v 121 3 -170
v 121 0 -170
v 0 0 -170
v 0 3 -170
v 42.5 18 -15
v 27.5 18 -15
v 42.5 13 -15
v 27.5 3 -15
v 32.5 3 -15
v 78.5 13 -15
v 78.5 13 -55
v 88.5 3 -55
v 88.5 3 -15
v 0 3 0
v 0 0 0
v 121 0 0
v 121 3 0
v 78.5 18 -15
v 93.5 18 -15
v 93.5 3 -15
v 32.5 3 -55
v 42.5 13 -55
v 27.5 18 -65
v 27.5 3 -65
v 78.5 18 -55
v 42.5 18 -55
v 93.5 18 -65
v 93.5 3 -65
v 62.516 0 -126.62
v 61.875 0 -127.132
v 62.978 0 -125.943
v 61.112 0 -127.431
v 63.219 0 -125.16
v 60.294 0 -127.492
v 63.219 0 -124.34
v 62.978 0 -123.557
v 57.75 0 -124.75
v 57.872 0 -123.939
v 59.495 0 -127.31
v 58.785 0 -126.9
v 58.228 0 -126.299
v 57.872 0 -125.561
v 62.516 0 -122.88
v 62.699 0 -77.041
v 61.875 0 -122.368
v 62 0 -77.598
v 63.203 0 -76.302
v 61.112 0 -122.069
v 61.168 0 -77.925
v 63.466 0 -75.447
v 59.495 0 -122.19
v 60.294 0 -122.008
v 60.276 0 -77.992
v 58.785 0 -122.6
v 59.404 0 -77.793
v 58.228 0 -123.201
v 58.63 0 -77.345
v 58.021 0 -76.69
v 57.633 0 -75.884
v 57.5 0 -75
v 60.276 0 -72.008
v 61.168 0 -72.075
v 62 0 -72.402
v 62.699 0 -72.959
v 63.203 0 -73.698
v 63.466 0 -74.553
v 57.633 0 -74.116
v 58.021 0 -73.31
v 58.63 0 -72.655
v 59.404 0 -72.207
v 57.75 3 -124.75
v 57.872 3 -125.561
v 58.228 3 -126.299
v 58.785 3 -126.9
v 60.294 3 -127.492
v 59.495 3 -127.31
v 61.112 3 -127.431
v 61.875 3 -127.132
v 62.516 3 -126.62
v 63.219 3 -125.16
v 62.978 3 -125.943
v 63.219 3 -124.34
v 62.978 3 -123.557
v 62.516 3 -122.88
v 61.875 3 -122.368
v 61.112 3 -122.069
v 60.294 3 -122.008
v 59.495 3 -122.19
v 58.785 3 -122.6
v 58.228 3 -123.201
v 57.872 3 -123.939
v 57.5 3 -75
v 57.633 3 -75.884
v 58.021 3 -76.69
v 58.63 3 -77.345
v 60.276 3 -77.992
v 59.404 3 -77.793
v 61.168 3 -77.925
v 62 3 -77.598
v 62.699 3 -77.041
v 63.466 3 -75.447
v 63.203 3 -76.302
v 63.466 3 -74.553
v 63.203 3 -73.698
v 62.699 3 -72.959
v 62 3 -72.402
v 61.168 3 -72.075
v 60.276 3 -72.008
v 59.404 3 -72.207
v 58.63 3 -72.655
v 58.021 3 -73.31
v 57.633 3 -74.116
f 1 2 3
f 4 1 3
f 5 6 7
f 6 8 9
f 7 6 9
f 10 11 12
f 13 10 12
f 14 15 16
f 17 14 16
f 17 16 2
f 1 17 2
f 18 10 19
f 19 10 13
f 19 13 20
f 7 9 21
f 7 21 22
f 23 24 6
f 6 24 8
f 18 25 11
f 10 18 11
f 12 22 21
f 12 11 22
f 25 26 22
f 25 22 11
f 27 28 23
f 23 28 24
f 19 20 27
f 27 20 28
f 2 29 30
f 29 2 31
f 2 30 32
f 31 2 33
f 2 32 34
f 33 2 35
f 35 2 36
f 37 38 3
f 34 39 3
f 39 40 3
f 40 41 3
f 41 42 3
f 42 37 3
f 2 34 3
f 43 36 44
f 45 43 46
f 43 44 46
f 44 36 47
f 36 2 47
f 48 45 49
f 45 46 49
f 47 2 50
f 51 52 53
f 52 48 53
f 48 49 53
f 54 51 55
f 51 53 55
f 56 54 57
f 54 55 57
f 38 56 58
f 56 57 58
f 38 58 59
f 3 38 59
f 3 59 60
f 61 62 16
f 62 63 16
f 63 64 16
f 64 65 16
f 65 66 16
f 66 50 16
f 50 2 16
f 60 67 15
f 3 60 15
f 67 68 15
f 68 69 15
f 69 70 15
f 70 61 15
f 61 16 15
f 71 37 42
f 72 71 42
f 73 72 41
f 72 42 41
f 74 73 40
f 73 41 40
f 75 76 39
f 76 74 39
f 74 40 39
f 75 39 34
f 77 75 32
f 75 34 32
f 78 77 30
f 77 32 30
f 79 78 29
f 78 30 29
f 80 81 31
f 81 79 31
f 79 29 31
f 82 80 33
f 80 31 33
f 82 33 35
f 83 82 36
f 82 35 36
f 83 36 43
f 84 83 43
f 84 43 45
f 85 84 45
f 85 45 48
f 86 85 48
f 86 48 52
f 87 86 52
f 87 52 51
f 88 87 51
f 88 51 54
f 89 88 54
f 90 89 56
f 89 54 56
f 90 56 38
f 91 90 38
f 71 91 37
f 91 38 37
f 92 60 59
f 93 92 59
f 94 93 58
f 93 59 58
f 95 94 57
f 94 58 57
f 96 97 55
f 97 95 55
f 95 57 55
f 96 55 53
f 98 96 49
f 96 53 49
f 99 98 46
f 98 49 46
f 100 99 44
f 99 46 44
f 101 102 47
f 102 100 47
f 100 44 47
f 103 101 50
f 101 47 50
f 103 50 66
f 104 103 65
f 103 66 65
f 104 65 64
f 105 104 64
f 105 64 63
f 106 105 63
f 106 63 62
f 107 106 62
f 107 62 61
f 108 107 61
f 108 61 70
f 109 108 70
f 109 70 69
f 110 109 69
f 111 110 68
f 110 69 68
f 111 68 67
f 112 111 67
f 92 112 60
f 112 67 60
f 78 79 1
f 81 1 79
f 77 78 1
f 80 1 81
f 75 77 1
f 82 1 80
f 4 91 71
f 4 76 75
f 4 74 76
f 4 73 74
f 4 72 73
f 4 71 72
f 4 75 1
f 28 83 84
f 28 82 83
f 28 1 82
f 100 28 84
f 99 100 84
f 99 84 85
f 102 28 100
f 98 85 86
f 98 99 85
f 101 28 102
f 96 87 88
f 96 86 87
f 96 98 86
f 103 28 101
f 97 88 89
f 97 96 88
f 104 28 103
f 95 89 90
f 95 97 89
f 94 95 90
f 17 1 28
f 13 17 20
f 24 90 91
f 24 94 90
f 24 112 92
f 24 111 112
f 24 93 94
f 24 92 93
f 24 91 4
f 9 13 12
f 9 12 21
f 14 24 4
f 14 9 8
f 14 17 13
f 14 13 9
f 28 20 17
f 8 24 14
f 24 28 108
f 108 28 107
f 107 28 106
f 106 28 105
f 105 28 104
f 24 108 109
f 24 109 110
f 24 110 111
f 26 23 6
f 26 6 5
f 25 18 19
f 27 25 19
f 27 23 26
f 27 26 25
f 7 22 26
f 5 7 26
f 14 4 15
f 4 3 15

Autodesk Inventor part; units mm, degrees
ref_plane "YZ Plane" through (0, 0, 0) normal (1, 0, 0) x (0, 1, 0)
ref_plane "XZ Plane" through (0, 0, 0) normal (0, 1, 0) x (-1, 0, 0)
ref_plane "XY Plane" through (0, 0, 0) normal (0, 0, 1) x (1, 0, 0)
sketch "Skizze1" plane through (0, 0, 0) normal (0, 1, 0) x (-1, 0, 0)
  line L0 (0, 0) -> (-121, 0)
  line L1 (-121, 0) -> (-121, -170)
  line L2 (-121, -170) -> (0, -170)
  line L3 (0, -170) -> (0, 0)
  circle A0 centre (-60.5, -75) radius 3
  circle A1 centre (-60.5, -124.75) radius 2.75
  dimension "d0" = 121
  dimension "d1" = 170
  dimension "d2" = 75
  dimension "d3" = 6
  dimension "d4" = 60.5
  dimension "d5" = 49.75
  dimension "d6" = 60.5
  dimension "d7" = 5.5
extrude "Extrusion1" add sketch "Skizze1" along normal blind 3
sketch "Skizze6" plane through (0, 3, 0) normal (0, 1, 0) x (1, 0, 0)
  line L0 (27.5, 15) -> (93.5, 15)
  line L1 (93.5, 15) -> (93.5, 65)
  line L2 (93.5, 65) -> (27.5, 65)
  line L3 (27.5, 65) -> (27.5, 15)
  line L4 (0, 170) -> (0, 0) projected
  line L5 (0, 0) -> (121, 0) projected
  dimension "d72" = 66
  dimension "d73" = 50
  dimension "d74" = 27.5
  dimension "d75" = 15
extrude "Extrusion6" add sketch "Skizze6" along normal blind 15
sketch "Skizze7" plane through (27.5, 3, -15) normal (0, 0, 1) x (1, 0, 0)
  line L0 (66, 15) -> (0, 15) projected
  line L1 (0, 0) -> (66, 0) projected
  line L2 (15, 15) -> (51, 15)
  line L3 (51, 15) -> (51, 0)
  line L4 (51, 0) -> (15, 0)
  line L5 (15, 0) -> (15, 15)
  line L6 (0, 0) -> (0, 15) projected
  line L7 (0, 0) -> (21.2132, 0) construction
  line L8 (66, 0) -> (87.2132, 0) construction
  line L9 (66, 0) -> (66, 15) projected
  line L10 (93.5, 0) -> (-27.5, 0) projected
  line L11 (5, 0) -> (15, 10)
  line L12 (5, 0) -> (19.1421, 0) construction
  line L13 (51, 10) -> (61, 0)
  line L14 (51, 10) -> (65.1421, 10) construction
  line L15 (15, 15) -> (51, 15)
  line L16 (51, 15) -> (51, 10)
  line L17 (51, 10) -> (15, 10)
  line L18 (15, 10) -> (15, 15)
  point P0 (-27.5, -3)
  dimension "d78" = 36
  dimension "d79" = 15
  dimension "d85" = 45
  dimension "d86" = 45
extrude "Extrusion7" cut sketch "Skizze7" against normal blind 40 contours L3 L17 L5 L0 | L13 L1 L3 | L3 L1 L5 L17 | L5 L1 L11
sketch "Skizze8" plane through (0, 3, 0) normal (0, 1, 0) x (1, 0, 0)
  point P0 (0, 0)
properties part number "platform-mount"
